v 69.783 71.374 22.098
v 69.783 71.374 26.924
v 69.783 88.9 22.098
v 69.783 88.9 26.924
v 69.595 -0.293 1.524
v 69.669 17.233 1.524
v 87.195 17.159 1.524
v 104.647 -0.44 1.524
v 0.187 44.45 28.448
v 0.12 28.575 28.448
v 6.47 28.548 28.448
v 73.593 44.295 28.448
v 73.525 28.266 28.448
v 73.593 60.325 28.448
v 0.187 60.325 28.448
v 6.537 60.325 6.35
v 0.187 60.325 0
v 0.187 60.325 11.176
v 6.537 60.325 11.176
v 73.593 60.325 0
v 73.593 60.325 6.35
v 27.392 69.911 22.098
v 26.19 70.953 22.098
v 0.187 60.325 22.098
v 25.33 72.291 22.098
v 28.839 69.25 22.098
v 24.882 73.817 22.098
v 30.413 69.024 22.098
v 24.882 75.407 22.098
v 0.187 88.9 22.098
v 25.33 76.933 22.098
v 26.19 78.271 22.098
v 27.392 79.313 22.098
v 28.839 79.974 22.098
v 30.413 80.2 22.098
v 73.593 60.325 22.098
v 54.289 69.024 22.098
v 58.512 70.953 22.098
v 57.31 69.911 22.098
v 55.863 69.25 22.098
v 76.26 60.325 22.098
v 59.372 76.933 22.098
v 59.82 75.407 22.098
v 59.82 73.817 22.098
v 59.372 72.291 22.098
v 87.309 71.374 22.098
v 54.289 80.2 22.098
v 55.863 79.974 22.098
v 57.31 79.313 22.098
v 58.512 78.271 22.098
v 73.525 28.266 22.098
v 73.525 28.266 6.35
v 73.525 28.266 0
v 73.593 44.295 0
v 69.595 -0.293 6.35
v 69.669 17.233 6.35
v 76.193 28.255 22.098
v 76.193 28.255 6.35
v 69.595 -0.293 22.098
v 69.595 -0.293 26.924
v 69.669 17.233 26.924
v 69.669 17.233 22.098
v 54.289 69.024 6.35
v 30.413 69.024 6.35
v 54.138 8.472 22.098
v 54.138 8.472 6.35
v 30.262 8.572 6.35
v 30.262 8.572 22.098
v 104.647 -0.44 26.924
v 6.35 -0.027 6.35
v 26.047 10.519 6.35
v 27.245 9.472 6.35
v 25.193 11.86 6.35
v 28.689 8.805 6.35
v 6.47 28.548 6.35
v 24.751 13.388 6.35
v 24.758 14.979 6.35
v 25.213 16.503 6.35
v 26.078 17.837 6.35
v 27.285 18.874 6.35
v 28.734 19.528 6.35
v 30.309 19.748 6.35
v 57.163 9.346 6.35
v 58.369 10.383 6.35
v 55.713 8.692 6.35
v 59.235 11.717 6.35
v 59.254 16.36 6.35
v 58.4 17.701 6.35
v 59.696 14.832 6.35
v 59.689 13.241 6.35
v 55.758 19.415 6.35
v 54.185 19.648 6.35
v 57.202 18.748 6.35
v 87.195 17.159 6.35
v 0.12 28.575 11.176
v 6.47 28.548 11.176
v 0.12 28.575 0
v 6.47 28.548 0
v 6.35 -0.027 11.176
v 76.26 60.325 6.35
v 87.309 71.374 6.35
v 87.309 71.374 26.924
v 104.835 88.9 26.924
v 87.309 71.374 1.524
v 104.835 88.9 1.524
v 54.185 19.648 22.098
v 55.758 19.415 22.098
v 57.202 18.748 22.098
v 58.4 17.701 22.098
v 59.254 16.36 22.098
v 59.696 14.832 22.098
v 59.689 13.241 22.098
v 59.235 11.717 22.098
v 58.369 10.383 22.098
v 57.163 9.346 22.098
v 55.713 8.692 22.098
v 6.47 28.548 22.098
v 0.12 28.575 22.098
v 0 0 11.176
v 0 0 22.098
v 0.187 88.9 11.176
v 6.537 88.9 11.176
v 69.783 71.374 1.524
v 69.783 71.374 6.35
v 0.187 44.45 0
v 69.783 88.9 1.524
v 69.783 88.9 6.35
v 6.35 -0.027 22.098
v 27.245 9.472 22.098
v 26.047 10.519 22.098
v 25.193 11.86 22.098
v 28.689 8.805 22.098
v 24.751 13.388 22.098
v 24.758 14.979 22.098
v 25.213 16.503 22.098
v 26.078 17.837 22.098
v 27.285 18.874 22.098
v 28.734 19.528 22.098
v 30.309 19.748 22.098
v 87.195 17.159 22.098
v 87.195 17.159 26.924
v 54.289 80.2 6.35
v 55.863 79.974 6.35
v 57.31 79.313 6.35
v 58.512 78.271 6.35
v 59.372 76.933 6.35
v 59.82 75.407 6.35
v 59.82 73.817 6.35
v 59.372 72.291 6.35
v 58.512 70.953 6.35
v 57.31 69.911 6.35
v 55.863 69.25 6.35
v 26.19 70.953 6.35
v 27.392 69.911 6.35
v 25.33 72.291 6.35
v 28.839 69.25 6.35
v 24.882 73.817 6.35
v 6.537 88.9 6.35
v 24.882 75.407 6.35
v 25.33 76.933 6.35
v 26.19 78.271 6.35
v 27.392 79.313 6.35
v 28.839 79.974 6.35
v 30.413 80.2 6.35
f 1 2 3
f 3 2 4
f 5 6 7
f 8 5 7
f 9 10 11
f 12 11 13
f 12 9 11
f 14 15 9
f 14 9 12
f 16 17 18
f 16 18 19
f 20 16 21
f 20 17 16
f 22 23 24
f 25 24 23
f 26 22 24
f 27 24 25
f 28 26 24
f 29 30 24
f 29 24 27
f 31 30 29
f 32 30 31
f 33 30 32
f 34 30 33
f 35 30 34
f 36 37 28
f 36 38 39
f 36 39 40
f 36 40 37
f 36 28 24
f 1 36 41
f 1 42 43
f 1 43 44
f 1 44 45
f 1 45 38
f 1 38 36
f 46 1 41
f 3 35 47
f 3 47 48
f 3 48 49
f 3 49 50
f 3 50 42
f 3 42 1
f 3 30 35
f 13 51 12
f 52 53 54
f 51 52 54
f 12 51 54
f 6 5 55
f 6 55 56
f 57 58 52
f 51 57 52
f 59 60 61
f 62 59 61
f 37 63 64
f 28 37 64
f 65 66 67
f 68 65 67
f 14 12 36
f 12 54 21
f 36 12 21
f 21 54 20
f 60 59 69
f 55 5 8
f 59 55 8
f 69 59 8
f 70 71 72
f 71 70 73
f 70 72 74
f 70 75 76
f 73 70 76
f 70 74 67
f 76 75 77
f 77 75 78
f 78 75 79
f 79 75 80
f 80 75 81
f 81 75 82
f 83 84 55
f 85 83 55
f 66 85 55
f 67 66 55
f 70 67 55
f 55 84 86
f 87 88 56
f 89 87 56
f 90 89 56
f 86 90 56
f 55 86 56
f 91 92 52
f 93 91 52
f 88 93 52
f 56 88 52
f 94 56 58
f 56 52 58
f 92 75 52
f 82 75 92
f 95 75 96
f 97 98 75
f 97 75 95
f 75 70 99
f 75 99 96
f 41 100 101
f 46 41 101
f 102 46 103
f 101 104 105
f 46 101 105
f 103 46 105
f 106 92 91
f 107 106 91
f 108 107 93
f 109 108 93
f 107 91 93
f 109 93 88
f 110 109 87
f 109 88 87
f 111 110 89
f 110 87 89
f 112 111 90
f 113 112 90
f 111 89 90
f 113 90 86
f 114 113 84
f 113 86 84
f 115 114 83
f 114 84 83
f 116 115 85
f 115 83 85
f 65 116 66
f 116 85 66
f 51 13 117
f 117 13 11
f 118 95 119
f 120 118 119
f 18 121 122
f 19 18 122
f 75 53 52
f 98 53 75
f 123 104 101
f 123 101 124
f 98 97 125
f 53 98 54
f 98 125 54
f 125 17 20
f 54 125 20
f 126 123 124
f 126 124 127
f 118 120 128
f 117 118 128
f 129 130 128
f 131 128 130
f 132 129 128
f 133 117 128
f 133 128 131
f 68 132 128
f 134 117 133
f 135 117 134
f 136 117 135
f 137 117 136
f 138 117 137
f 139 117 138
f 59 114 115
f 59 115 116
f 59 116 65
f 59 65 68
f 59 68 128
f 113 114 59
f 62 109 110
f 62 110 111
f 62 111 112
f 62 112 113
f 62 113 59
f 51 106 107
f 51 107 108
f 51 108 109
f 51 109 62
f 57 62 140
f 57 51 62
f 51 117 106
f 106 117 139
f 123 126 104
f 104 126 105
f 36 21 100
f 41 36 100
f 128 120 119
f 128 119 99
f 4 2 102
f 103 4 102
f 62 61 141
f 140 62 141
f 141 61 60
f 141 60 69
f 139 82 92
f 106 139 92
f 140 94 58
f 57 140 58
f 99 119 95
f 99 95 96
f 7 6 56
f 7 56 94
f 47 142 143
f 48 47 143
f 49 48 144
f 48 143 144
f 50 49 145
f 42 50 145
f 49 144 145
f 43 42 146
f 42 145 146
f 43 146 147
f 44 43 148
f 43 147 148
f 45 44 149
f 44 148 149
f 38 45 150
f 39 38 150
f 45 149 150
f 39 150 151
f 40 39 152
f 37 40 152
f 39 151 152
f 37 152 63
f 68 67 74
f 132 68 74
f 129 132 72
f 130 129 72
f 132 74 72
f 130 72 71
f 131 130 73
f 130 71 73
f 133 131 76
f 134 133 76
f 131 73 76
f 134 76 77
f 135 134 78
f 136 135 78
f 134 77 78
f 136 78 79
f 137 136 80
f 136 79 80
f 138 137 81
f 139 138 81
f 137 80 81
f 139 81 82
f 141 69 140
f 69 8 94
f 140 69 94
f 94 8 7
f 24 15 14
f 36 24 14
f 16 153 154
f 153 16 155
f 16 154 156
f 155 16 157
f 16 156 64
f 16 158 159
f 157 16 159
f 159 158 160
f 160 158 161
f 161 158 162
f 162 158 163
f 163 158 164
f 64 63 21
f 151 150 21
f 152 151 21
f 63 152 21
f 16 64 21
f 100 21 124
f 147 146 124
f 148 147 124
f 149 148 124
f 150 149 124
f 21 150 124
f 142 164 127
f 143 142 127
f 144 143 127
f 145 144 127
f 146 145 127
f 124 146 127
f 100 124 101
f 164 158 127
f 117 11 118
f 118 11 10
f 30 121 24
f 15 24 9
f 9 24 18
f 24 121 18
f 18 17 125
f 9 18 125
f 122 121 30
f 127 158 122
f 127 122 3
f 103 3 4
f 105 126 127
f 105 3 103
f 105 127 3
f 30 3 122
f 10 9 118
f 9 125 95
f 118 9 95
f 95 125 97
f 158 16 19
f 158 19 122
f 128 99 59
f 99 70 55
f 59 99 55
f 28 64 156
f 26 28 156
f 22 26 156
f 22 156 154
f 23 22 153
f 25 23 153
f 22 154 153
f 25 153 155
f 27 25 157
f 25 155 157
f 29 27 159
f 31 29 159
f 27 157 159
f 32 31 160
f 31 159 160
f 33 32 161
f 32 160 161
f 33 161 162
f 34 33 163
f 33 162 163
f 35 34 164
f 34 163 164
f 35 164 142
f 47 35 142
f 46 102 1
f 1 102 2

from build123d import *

# Parameters (mm, degrees)
F0_W     = 6.35
F0_H     = 28.575
F1_DEPTH = 28.448
F3_DEPTH = 1.524
F4_DEPTH = 1.524
F5_DEPTH = 6.35
F6_DEPTH = 11.176
F7_DEPTH = 11.176
F2_W     = 6.35
F2_H     = 28.575
F8_DEPTH = 6.35


with BuildPart() as f1:
    # F0 (on Top) → F1 (new body)
    with BuildSketch(Plane.XY):
        Polygon((6.53696, 60.324607), (0.18696, 60.324607), (0.18696, 44.449607), (0.120189, 28.574747), (6.470133, 28.548039), (73.525377, 28.265996), (73.592798, 44.295231), (73.592798, 60.324607), align=None)
        Polygon((69.78296, 88.899607), (6.53696, 88.899607), (6.53696, 60.324607), (73.592798, 60.324607), (76.25996, 60.324607), (87.30896, 71.373607), (69.78296, 71.373607), align=None)
        with BuildLine():
            ThreePointArc((30.41296, 69.024107), (24.82496, 74.612107), (30.41296, 80.200107))
            Line((30.41296, 80.200107), (54.28896, 80.200107))
            ThreePointArc((54.28896, 80.200107), (59.87696, 74.612107), (54.28896, 69.024107))
            Line((54.28896, 69.024107), (30.41296, 69.024107))
        make_face(mode=Mode.SUBTRACT)
        with Locations((3.36196, 74.612107)):
            Rectangle(F0_W, F0_H)
        Polygon((73.525377, 28.265996), (6.470133, 28.548039), (6.349944, -0.026709), (69.595384, -0.292727), (69.6691, 17.233118), (87.194945, 17.159402), (76.192516, 28.254778), align=None)
        with BuildLine():
            Line((54.138112, 8.471865), (30.262323, 8.57229))
            ThreePointArc((30.262323, 8.57229), (24.697876, 14.183744), (30.309331, 19.748191))
            Line((30.309331, 19.748191), (54.185119, 19.647767))
            ThreePointArc((54.185119, 19.647767), (59.749566, 14.036312), (54.138112, 8.471865))
        make_face(mode=Mode.SUBTRACT)
        Polygon((69.6691, 17.233118), (69.595384, -0.292727), (104.647074, -0.440158), (87.194945, 17.159402), align=None)
        Polygon((6.470133, 28.548039), (0.120189, 28.574747), (0, 0), (6.349944, -0.026709), align=None)
        Polygon((104.83496, 88.899607), (69.78296, 88.899607), (69.78296, 71.373607), (87.30896, 71.373607), align=None)
    extrude(amount=F1_DEPTH)

    # F2 (on face) → F3 (cut)
    with BuildSketch(Plane.XY.offset(28.448)):
        Polygon((104.647074, -0.440158), (87.194945, 17.159402), (69.6691, 17.233118), (69.595384, -0.292727), align=None)
        Polygon((69.78296, 71.373607), (87.30896, 71.373607), (104.83496, 88.899607), (69.78296, 88.899607), align=None)
    extrude(amount=-F3_DEPTH, mode=Mode.SUBTRACT)

    # F0 (on Top) → F4 (cut)
    with BuildSketch(Plane.XY):
        Polygon((69.6691, 17.233118), (69.595384, -0.292727), (104.647074, -0.440158), (87.194945, 17.159402), align=None)
        Polygon((104.83496, 88.899607), (69.78296, 88.899607), (69.78296, 71.373607), (87.30896, 71.373607), align=None)
    extrude(amount=F4_DEPTH, mode=Mode.SUBTRACT)

    # F0 (on Top) → F5 (cut)
    with BuildSketch(Plane.XY):
        Polygon((73.525377, 28.265996), (6.470133, 28.548039), (6.349944, -0.026709), (69.595384, -0.292727), (69.6691, 17.233118), (87.194945, 17.159402), (76.192516, 28.254778), align=None)
        with BuildLine():
            Line((54.138112, 8.471865), (30.262323, 8.57229))
            ThreePointArc((30.262323, 8.57229), (24.697876, 14.183744), (30.309331, 19.748191))
            Line((30.309331, 19.748191), (54.185119, 19.647767))
            ThreePointArc((54.185119, 19.647767), (59.749566, 14.036312), (54.138112, 8.471865))
        make_face(mode=Mode.SUBTRACT)
        Polygon((69.78296, 88.899607), (6.53696, 88.899607), (6.53696, 60.324607), (73.592798, 60.324607), (76.25996, 60.324607), (87.30896, 71.373607), (69.78296, 71.373607), align=None)
        with BuildLine():
            ThreePointArc((30.41296, 69.024107), (24.82496, 74.612107), (30.41296, 80.200107))
            Line((30.41296, 80.200107), (54.28896, 80.200107))
            ThreePointArc((54.28896, 80.200107), (59.87696, 74.612107), (54.28896, 69.024107))
            Line((54.28896, 69.024107), (30.41296, 69.024107))
        make_face(mode=Mode.SUBTRACT)
        Polygon((6.470133, 28.548039), (0.120189, 28.574747), (0, 0), (6.349944, -0.026709), align=None)
        with Locations((3.36196, 74.612107)):
            Rectangle(F0_W, F0_H)
    extrude(amount=F5_DEPTH, mode=Mode.SUBTRACT)

    # F0 (on Top) → F6 (join)
    with BuildSketch(Plane.XY):
        Polygon((6.470133, 28.548039), (0.120189, 28.574747), (0, 0), (6.349944, -0.026709), align=None)
        with Locations((3.36196, 74.612107)):
            Rectangle(F0_W, F0_H)
    extrude(amount=F6_DEPTH)

    # F0 (on Top) → F7 (cut)
    with BuildSketch(Plane.XY):
        Polygon((6.470133, 28.548039), (0.120189, 28.574747), (0, 0), (6.349944, -0.026709), align=None)
        with Locations((3.36196, 74.612107)):
            Rectangle(F0_W, F0_H)
    extrude(amount=F7_DEPTH, mode=Mode.SUBTRACT)

    # F2 (on face) → F8 (cut)
    with BuildSketch(Plane.XY.offset(28.448)):
        Polygon((69.6691, 17.233118), (87.194945, 17.159402), (76.192516, 28.254778), (73.525377, 28.265996), (6.470133, 28.548039), (6.349944, -0.026709), (69.595384, -0.292727), align=None)
        with BuildLine():
            Line((30.309331, 19.748191), (54.185119, 19.647767))
            ThreePointArc((54.185119, 19.647767), (59.749566, 14.036312), (54.138112, 8.471865))
            Line((54.138112, 8.471865), (30.262323, 8.57229))
            ThreePointArc((30.262323, 8.57229), (24.697876, 14.183744), (30.309331, 19.748191))
        make_face(mode=Mode.SUBTRACT)
        Polygon((6.53696, 60.324607), (73.592798, 60.324607), (76.25996, 60.324607), (87.30896, 71.373607), (69.78296, 71.373607), (69.78296, 88.899607), (6.53696, 88.899607), align=None)
        with BuildLine():
            ThreePointArc((30.41296, 69.024107), (24.82496, 74.612107), (30.41296, 80.200107))
            Line((30.41296, 80.200107), (54.28896, 80.200107))
            ThreePointArc((54.28896, 80.200107), (59.87696, 74.612107), (54.28896, 69.024107))
            Line((54.28896, 69.024107), (30.41296, 69.024107))
        make_face(mode=Mode.SUBTRACT)
        Polygon((0, 0), (6.349944, -0.026709), (6.470133, 28.548039), (0.120189, 28.574747), align=None)
        with Locations((3.36196, 74.612107)):
            Rectangle(F2_W, F2_H)
    extrude(amount=-F8_DEPTH, mode=Mode.SUBTRACT)


solid = f1.part
